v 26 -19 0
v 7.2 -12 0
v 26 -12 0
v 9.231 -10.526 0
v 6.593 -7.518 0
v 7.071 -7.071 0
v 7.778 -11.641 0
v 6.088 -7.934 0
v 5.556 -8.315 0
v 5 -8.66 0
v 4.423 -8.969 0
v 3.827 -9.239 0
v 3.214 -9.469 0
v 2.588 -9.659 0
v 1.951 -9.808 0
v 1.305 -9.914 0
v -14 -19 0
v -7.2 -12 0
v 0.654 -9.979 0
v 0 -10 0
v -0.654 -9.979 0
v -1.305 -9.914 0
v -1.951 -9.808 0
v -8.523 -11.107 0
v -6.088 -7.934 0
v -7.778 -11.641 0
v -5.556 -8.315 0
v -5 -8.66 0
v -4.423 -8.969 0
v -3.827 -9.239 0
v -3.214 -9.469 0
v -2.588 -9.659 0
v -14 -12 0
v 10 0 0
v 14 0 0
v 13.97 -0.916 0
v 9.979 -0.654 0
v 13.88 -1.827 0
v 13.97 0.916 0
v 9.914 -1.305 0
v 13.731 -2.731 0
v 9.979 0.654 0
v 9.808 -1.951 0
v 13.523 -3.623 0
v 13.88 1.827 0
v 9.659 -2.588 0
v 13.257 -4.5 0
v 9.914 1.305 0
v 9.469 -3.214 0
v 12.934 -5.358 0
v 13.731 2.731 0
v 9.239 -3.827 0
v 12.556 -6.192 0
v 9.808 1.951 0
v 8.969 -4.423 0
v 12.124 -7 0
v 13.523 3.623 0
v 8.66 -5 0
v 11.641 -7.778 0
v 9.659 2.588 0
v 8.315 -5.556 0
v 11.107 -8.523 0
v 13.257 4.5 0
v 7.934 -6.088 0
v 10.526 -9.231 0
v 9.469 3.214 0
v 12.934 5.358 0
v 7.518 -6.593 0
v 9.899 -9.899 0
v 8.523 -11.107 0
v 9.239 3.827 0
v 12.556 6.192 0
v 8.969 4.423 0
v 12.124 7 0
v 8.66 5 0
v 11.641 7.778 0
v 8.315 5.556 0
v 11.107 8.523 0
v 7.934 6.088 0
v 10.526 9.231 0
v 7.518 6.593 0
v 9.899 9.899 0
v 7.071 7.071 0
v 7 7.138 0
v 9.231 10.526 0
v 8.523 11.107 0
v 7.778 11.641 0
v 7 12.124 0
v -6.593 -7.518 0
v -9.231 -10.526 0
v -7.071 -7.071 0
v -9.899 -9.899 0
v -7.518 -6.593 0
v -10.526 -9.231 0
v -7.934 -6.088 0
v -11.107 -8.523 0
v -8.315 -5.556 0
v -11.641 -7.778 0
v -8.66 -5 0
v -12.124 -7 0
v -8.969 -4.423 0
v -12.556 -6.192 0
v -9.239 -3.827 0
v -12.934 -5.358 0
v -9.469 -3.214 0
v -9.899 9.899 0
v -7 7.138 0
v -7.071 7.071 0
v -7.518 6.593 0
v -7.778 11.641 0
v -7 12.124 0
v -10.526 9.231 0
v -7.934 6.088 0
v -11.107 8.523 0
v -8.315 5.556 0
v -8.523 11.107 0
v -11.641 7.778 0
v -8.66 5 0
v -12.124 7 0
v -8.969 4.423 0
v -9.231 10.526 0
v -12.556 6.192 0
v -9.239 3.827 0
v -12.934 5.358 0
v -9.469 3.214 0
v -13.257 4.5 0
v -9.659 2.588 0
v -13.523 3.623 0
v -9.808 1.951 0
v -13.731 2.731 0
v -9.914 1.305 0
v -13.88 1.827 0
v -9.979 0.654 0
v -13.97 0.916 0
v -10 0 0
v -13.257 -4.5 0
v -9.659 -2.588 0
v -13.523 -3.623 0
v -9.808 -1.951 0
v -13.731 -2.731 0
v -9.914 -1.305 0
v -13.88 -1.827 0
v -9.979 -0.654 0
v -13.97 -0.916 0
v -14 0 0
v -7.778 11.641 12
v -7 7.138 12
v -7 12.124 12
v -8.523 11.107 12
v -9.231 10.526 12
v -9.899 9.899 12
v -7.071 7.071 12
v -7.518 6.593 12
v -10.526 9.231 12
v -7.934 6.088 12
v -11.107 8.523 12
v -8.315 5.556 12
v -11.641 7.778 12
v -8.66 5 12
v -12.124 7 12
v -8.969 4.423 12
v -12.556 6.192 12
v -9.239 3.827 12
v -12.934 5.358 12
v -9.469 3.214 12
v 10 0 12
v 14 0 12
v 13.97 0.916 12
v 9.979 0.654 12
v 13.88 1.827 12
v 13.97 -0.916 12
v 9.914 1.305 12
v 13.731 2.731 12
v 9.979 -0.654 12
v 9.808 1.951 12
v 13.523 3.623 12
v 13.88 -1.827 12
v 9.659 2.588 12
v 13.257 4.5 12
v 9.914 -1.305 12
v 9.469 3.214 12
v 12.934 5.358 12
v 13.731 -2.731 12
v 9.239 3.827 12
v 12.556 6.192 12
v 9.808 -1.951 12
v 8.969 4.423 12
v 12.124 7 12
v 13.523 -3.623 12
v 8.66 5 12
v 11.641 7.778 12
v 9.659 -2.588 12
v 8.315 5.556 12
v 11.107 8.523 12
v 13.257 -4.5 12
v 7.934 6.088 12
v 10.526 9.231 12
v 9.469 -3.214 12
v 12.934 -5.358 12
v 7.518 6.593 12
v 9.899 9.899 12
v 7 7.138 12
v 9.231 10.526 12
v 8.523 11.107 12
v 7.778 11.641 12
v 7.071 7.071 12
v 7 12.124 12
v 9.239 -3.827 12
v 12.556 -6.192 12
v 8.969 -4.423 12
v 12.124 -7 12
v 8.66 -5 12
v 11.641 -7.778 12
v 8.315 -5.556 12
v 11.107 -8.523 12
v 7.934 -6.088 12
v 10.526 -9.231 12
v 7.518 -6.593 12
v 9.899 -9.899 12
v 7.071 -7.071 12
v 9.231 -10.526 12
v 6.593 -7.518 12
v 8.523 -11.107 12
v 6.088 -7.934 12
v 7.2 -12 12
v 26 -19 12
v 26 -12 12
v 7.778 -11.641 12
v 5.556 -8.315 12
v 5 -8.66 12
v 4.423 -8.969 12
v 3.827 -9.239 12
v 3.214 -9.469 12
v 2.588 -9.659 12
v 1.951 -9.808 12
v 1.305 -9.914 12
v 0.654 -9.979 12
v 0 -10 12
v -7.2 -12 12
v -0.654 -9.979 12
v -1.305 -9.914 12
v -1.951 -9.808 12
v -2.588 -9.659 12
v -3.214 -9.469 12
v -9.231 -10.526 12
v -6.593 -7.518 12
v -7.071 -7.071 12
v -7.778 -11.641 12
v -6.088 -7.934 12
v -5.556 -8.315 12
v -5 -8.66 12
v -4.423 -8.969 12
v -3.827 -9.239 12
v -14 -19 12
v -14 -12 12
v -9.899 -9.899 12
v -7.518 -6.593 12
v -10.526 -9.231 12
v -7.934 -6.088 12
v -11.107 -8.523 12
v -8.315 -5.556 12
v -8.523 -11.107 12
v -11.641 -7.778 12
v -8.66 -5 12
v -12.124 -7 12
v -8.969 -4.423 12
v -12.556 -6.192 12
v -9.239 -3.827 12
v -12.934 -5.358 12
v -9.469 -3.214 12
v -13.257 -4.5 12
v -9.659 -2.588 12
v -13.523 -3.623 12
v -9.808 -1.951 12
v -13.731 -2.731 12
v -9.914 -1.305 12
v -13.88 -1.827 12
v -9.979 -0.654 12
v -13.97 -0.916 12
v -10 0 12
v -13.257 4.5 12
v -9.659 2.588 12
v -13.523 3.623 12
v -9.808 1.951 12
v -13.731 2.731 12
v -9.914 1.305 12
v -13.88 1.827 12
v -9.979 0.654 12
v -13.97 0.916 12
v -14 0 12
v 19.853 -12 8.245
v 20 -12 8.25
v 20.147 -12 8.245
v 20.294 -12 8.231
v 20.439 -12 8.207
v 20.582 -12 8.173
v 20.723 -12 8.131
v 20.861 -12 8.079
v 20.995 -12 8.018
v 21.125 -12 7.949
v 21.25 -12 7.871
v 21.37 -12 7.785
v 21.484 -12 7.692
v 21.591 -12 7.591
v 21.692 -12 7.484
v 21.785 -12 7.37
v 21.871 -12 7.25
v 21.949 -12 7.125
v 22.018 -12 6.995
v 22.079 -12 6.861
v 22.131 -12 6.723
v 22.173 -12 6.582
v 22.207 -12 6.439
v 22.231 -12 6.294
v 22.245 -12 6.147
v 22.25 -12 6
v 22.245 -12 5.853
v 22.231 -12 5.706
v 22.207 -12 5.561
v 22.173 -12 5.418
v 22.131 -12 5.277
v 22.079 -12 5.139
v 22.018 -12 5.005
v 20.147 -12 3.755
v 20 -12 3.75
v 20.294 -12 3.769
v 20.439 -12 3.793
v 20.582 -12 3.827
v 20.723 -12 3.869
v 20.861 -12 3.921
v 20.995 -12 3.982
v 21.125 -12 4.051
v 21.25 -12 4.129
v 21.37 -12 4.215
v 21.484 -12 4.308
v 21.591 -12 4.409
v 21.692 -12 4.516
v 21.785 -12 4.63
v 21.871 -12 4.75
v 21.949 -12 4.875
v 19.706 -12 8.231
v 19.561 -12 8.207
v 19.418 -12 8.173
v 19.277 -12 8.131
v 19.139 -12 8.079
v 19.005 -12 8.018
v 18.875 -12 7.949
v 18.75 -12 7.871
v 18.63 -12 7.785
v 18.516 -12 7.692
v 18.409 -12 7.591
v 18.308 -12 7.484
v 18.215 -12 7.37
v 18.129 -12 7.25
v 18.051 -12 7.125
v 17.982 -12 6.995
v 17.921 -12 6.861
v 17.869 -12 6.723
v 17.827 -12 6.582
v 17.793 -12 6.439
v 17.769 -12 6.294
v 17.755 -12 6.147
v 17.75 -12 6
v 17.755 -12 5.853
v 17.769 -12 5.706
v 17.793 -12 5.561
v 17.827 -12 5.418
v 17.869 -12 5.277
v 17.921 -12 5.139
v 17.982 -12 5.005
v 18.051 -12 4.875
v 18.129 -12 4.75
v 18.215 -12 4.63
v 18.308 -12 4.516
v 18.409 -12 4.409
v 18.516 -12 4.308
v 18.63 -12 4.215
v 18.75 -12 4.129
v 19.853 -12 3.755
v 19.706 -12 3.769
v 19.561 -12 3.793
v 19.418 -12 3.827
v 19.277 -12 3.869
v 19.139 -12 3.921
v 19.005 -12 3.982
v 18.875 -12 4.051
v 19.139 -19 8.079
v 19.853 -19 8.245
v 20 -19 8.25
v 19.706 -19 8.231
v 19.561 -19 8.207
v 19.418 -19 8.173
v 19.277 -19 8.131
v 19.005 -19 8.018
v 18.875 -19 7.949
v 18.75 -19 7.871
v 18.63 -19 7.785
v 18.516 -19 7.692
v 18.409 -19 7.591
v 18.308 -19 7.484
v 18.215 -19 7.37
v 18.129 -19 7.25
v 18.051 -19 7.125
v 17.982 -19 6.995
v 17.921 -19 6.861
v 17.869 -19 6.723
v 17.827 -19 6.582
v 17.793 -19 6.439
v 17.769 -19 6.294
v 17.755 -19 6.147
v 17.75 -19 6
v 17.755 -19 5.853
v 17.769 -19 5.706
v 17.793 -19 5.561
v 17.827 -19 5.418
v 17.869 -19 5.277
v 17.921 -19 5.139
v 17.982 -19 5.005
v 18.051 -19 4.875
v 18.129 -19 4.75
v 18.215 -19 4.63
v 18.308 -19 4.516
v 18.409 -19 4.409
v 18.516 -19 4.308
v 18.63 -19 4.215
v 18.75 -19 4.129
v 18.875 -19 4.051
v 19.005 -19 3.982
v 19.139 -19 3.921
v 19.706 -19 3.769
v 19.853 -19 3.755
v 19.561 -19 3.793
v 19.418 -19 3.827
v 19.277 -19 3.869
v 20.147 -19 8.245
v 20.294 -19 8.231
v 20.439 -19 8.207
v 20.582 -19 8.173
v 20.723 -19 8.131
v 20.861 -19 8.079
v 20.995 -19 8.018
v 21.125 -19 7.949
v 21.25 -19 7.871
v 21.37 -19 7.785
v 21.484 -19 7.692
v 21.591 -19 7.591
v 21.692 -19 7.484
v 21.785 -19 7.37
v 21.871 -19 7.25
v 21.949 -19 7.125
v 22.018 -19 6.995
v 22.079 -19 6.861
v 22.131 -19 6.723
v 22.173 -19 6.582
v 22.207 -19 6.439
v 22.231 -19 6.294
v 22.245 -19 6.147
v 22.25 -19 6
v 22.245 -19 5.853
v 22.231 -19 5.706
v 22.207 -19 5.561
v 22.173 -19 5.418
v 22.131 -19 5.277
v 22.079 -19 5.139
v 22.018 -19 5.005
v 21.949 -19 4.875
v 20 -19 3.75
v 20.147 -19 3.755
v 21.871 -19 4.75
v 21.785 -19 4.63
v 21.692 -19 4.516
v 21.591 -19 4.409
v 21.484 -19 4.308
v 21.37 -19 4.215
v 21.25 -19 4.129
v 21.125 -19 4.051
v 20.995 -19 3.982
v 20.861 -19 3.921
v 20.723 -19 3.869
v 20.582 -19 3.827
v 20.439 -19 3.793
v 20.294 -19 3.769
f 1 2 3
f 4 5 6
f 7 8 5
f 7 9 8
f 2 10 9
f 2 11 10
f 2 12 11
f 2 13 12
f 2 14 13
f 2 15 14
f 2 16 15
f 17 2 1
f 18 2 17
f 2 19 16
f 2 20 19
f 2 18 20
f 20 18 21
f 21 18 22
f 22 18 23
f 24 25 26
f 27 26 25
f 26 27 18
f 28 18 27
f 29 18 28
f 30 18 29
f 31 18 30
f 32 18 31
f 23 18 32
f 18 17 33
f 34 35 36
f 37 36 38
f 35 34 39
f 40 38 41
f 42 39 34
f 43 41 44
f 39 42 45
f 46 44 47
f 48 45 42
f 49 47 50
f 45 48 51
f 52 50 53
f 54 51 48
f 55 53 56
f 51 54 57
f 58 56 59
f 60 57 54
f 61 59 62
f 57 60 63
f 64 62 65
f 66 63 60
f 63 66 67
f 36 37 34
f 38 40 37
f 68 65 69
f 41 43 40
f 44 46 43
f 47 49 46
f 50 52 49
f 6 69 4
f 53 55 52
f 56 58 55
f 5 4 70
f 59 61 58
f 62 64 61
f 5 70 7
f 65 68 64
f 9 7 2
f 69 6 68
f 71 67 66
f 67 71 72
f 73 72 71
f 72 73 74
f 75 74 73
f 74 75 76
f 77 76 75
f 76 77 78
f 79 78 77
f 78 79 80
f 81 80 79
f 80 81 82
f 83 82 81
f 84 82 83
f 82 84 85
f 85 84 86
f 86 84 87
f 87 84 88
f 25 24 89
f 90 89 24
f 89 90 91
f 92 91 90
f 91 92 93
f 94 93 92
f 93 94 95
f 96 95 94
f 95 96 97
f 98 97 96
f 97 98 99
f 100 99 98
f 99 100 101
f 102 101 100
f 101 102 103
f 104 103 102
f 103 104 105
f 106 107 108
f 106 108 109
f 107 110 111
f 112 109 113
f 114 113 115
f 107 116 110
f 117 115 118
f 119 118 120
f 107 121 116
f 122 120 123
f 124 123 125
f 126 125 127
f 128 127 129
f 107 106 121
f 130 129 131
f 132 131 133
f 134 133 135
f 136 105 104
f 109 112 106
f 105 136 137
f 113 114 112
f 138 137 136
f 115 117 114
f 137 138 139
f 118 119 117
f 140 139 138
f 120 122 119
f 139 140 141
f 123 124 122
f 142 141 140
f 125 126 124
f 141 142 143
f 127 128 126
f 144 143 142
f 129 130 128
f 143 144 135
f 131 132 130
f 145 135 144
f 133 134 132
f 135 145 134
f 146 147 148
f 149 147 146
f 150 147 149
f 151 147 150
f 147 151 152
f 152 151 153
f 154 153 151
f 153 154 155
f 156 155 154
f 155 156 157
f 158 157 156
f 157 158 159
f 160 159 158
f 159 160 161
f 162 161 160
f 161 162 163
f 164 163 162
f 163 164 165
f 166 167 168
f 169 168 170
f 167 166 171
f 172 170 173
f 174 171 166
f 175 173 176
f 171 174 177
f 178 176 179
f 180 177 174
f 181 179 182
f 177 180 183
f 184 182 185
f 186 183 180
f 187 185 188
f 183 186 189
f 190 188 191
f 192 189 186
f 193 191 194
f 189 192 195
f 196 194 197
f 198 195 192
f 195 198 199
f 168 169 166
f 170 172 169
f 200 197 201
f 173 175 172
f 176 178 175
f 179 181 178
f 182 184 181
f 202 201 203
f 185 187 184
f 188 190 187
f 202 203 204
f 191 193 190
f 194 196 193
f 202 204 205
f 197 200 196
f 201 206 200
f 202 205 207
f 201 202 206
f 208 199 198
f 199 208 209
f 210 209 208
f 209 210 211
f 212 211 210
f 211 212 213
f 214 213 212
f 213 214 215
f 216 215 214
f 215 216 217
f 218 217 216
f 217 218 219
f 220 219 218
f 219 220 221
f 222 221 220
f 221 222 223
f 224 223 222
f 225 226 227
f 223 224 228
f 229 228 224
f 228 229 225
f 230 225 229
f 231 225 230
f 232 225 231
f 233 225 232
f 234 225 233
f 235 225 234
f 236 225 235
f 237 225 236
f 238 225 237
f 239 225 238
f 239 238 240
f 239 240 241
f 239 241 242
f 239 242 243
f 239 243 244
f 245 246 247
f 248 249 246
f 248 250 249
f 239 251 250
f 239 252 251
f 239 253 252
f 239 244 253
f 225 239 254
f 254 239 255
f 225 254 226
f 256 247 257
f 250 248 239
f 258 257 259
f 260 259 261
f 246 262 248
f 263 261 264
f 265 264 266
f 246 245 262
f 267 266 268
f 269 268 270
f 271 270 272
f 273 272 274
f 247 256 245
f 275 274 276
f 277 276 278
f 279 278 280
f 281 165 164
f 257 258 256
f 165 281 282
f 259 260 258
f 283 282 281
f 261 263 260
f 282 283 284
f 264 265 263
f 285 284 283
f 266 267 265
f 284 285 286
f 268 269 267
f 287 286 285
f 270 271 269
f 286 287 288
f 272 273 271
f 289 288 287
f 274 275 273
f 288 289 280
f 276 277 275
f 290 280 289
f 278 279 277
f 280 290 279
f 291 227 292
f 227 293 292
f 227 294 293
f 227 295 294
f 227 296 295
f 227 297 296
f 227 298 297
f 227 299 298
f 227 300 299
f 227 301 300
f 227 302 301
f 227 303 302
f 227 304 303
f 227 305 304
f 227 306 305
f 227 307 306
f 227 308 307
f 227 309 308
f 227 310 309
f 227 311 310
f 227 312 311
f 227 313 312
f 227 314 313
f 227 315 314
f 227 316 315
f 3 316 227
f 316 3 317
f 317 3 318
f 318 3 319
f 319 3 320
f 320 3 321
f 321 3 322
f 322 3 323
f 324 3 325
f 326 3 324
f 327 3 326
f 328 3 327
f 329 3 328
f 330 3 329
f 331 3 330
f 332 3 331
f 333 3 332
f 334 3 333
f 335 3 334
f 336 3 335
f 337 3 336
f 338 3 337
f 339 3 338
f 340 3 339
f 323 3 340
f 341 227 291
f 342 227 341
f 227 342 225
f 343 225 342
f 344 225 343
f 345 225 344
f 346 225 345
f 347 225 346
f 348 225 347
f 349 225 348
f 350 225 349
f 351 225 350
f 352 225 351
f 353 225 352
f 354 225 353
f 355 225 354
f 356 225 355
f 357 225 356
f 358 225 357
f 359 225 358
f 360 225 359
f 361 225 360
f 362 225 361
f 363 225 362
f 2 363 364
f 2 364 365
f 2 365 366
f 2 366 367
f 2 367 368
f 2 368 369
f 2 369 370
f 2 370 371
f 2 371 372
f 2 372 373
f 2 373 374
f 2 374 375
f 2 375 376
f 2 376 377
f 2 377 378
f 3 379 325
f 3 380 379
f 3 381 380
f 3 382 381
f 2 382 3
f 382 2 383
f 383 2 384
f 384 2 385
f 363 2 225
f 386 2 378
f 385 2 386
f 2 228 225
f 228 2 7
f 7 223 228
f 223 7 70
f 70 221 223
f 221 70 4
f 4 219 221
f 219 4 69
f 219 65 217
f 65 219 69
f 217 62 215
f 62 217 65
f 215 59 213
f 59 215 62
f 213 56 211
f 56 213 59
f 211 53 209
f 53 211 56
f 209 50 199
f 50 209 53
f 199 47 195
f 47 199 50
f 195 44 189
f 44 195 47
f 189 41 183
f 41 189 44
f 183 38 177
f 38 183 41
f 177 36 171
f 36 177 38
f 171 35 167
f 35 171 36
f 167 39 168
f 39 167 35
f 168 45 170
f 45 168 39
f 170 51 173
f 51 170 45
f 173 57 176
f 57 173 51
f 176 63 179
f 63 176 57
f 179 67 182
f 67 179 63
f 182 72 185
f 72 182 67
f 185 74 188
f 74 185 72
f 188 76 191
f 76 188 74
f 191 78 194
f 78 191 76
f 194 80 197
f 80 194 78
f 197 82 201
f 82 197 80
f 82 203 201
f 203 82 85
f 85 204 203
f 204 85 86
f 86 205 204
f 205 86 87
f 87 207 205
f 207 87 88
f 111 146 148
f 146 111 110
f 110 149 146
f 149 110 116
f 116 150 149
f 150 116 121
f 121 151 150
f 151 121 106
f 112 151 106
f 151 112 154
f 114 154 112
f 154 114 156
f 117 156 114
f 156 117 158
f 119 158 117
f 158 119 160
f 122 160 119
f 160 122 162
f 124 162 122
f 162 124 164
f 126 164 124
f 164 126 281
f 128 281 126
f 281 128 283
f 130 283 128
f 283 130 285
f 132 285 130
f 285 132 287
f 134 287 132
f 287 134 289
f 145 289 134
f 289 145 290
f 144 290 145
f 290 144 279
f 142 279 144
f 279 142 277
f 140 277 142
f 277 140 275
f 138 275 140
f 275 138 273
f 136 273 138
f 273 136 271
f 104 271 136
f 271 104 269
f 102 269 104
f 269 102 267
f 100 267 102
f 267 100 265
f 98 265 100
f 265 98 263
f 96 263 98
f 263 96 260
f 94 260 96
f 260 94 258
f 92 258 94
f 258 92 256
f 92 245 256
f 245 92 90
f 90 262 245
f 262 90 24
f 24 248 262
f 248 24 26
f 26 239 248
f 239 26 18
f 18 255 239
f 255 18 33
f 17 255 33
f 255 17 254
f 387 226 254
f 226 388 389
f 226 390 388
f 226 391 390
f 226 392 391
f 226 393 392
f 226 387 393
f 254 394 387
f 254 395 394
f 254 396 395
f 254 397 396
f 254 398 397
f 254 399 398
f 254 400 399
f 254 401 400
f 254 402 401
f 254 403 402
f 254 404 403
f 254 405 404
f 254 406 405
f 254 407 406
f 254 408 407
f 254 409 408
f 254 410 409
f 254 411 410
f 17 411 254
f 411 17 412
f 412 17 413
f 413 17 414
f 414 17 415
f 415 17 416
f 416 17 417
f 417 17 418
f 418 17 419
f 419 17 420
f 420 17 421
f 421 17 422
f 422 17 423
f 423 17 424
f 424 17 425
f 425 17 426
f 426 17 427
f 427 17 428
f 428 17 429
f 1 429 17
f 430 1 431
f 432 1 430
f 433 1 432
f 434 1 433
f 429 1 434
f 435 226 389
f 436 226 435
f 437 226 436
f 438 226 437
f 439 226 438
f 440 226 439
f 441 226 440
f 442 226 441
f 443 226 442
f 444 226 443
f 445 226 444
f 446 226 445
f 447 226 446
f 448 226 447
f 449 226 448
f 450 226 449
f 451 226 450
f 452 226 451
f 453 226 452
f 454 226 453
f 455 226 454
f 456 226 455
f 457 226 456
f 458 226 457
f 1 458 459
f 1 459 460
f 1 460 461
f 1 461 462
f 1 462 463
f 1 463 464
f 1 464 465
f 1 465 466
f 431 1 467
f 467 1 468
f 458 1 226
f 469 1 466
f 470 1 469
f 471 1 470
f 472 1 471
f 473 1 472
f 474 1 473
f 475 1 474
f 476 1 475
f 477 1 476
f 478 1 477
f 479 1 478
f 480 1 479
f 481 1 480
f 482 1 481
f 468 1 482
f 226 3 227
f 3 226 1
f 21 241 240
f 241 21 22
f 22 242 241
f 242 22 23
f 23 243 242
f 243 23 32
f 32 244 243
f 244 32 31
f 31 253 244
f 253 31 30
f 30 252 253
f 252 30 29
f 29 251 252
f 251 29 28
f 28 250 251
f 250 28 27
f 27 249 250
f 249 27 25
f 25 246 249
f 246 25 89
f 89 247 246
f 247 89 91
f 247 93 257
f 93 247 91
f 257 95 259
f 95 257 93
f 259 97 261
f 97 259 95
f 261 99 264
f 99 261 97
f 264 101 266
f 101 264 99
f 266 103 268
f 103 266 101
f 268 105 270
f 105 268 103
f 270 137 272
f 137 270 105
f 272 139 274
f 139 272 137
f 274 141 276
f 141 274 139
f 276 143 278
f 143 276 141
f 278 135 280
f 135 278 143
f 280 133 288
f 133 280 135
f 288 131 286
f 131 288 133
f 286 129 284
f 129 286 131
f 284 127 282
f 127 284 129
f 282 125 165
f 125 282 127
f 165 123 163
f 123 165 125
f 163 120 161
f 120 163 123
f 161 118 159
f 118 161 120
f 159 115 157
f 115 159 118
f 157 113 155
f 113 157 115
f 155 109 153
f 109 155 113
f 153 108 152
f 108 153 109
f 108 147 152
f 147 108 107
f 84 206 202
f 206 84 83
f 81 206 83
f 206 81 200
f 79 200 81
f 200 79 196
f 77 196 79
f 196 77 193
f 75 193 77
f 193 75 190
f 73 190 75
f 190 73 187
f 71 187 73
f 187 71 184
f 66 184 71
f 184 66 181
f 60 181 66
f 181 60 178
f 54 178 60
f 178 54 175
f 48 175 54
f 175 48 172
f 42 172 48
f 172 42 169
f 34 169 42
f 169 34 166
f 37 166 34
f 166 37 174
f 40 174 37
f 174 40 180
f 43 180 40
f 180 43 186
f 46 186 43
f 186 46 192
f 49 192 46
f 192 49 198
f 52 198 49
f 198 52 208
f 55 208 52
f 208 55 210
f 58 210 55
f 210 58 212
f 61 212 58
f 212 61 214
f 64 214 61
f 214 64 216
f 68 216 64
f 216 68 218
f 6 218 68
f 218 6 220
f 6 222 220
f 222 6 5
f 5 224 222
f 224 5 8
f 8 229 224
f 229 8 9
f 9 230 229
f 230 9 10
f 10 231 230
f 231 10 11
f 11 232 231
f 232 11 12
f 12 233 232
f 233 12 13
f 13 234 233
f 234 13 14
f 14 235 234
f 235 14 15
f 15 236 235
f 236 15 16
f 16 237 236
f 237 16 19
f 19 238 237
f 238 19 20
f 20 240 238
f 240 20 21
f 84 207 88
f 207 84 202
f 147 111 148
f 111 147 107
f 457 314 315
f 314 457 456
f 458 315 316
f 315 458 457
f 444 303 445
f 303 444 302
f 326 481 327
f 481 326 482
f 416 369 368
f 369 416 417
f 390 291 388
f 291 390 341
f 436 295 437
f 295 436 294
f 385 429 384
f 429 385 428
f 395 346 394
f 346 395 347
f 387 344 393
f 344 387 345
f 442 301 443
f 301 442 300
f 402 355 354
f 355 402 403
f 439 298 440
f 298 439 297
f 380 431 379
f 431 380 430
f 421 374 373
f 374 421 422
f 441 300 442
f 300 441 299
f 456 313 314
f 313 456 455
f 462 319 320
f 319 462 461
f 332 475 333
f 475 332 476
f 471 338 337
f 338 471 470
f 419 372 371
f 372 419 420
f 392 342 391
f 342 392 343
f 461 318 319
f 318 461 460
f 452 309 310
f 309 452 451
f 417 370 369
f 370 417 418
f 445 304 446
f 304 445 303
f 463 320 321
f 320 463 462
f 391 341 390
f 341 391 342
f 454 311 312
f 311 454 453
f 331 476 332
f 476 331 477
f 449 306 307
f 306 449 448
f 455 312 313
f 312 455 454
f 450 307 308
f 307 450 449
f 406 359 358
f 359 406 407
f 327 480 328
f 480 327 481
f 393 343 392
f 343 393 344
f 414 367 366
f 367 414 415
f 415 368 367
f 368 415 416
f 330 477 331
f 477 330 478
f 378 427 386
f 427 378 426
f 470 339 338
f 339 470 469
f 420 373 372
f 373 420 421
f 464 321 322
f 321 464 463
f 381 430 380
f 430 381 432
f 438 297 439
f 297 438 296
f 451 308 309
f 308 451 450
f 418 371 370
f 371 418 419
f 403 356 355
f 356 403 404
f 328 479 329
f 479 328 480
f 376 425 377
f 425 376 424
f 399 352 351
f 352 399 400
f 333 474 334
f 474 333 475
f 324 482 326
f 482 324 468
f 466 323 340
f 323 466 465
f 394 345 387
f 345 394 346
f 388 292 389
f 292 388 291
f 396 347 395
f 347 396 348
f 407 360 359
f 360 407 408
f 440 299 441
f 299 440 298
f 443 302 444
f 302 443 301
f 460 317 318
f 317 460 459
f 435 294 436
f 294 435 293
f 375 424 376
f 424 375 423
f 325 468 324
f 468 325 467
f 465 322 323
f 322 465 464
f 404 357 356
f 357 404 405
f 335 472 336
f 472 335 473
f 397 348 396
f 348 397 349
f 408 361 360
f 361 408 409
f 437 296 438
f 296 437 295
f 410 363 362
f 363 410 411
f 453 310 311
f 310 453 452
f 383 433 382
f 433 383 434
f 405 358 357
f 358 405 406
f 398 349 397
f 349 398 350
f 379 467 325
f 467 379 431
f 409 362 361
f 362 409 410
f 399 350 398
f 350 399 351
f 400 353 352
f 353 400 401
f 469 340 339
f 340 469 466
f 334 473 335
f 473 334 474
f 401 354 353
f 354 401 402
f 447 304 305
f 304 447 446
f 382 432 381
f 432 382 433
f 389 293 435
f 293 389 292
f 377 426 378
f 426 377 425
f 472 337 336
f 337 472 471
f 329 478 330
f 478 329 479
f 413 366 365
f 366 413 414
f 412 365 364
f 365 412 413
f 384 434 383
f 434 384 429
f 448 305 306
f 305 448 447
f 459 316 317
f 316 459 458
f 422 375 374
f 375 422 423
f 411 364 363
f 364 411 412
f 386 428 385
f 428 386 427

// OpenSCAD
// === DESCRIPTION ===
// Pipe clip: a C-shaped clip that holds a 20 mm OD garden-irrigation pipe against a
// fence post. The pipe is pushed into the clip's opening and can be unclipped again
// to move the line.
// Physical context: outdoors under a veranda, one M4 screw into a timber post; the
//   clip only holds the pipe's weight (well under 1 kg).
//
// Design decisions:
//   - The clip is one profile extruded straight up, so the ring flexes within the
//     layer plane when the pipe snaps in.
//   - The screw tab sits beside the ring so the screw head is clear of the pipe.
//   - Snaps on and off easily: the ring's arms flex open around the pipe.
//
// Terminology → code:
//   "ring"        → pipe_d, ring_t, ring()
//   "opening"     → opening_w, opening_cut()
//   "screw tab"   → tab_w, tab_t, tab()
//   "screw hole"  → screw_d, screw_x, screw_hole()
//
// Common modifications:
//   Other pipe size   → pipe_d (opening_w follows pipe_d)
//   Stiffer clip      → ring_t
//
// Overall dimensions: 40 x 31 x 12 mm (fits a Bambu A1, 256^3)
// Coordinate system: X = along the post, Y = away from the post, Z = clip height
// NOTE: Model is in print orientation: the pipe axis is Z.

// === PRINT SETTINGS ===
// Material: PLA
// Layer Height: 0.2mm
// Walls/Perimeters: 3 (1.35mm)
// Infill: 30% gyroid
// Supports: None required
// Orientation: As modeled, profile flat on the bed
// Notes: none

// === PARAMETERS ===
nozzle_diameter = 0.4;
layer_height = 0.2;

pipe_d = 20;          // pipe outside diameter
ring_t = 4;           // ring wall thickness
opening_w = 14;       // mouth width the pipe is pushed through
clip_h = 12;          // clip height (along the pipe)
tab_w = 40;           // screw tab length along the post
tab_t = 5;            // screw tab thickness
screw_d = 4.5;        // M4 clearance
screw_x = 20;         // screw position along the tab

// === DERIVED CONSTANTS ===
ring_r = pipe_d / 2 + ring_t;
fudge = 0.01;
$fn = $preview ? 48 : 96;

assert(screw_x - screw_d > ring_r, "screw hole clears the ring");

// === MODULES ===
module ring() difference() { circle(r = ring_r); circle(d = pipe_d); }

module tab() translate([-ring_r, -ring_r - tab_t]) square([tab_w, tab_t + 2]);

module profile() union() { ring(); tab(); }

module opening_cut() translate([-opening_w / 2, 0, 0]) cube([opening_w, ring_r + 1, clip_h]);

module screw_hole()
    translate([screw_x, 0, clip_h / 2]) rotate([90, 0, 0]) cylinder(d = screw_d, h = 2 * ring_r + 20, center = true);

// === ASSEMBLY / RENDER ===
difference() {
    linear_extrude(clip_h) profile();
    opening_cut();
    screw_hole();
}
